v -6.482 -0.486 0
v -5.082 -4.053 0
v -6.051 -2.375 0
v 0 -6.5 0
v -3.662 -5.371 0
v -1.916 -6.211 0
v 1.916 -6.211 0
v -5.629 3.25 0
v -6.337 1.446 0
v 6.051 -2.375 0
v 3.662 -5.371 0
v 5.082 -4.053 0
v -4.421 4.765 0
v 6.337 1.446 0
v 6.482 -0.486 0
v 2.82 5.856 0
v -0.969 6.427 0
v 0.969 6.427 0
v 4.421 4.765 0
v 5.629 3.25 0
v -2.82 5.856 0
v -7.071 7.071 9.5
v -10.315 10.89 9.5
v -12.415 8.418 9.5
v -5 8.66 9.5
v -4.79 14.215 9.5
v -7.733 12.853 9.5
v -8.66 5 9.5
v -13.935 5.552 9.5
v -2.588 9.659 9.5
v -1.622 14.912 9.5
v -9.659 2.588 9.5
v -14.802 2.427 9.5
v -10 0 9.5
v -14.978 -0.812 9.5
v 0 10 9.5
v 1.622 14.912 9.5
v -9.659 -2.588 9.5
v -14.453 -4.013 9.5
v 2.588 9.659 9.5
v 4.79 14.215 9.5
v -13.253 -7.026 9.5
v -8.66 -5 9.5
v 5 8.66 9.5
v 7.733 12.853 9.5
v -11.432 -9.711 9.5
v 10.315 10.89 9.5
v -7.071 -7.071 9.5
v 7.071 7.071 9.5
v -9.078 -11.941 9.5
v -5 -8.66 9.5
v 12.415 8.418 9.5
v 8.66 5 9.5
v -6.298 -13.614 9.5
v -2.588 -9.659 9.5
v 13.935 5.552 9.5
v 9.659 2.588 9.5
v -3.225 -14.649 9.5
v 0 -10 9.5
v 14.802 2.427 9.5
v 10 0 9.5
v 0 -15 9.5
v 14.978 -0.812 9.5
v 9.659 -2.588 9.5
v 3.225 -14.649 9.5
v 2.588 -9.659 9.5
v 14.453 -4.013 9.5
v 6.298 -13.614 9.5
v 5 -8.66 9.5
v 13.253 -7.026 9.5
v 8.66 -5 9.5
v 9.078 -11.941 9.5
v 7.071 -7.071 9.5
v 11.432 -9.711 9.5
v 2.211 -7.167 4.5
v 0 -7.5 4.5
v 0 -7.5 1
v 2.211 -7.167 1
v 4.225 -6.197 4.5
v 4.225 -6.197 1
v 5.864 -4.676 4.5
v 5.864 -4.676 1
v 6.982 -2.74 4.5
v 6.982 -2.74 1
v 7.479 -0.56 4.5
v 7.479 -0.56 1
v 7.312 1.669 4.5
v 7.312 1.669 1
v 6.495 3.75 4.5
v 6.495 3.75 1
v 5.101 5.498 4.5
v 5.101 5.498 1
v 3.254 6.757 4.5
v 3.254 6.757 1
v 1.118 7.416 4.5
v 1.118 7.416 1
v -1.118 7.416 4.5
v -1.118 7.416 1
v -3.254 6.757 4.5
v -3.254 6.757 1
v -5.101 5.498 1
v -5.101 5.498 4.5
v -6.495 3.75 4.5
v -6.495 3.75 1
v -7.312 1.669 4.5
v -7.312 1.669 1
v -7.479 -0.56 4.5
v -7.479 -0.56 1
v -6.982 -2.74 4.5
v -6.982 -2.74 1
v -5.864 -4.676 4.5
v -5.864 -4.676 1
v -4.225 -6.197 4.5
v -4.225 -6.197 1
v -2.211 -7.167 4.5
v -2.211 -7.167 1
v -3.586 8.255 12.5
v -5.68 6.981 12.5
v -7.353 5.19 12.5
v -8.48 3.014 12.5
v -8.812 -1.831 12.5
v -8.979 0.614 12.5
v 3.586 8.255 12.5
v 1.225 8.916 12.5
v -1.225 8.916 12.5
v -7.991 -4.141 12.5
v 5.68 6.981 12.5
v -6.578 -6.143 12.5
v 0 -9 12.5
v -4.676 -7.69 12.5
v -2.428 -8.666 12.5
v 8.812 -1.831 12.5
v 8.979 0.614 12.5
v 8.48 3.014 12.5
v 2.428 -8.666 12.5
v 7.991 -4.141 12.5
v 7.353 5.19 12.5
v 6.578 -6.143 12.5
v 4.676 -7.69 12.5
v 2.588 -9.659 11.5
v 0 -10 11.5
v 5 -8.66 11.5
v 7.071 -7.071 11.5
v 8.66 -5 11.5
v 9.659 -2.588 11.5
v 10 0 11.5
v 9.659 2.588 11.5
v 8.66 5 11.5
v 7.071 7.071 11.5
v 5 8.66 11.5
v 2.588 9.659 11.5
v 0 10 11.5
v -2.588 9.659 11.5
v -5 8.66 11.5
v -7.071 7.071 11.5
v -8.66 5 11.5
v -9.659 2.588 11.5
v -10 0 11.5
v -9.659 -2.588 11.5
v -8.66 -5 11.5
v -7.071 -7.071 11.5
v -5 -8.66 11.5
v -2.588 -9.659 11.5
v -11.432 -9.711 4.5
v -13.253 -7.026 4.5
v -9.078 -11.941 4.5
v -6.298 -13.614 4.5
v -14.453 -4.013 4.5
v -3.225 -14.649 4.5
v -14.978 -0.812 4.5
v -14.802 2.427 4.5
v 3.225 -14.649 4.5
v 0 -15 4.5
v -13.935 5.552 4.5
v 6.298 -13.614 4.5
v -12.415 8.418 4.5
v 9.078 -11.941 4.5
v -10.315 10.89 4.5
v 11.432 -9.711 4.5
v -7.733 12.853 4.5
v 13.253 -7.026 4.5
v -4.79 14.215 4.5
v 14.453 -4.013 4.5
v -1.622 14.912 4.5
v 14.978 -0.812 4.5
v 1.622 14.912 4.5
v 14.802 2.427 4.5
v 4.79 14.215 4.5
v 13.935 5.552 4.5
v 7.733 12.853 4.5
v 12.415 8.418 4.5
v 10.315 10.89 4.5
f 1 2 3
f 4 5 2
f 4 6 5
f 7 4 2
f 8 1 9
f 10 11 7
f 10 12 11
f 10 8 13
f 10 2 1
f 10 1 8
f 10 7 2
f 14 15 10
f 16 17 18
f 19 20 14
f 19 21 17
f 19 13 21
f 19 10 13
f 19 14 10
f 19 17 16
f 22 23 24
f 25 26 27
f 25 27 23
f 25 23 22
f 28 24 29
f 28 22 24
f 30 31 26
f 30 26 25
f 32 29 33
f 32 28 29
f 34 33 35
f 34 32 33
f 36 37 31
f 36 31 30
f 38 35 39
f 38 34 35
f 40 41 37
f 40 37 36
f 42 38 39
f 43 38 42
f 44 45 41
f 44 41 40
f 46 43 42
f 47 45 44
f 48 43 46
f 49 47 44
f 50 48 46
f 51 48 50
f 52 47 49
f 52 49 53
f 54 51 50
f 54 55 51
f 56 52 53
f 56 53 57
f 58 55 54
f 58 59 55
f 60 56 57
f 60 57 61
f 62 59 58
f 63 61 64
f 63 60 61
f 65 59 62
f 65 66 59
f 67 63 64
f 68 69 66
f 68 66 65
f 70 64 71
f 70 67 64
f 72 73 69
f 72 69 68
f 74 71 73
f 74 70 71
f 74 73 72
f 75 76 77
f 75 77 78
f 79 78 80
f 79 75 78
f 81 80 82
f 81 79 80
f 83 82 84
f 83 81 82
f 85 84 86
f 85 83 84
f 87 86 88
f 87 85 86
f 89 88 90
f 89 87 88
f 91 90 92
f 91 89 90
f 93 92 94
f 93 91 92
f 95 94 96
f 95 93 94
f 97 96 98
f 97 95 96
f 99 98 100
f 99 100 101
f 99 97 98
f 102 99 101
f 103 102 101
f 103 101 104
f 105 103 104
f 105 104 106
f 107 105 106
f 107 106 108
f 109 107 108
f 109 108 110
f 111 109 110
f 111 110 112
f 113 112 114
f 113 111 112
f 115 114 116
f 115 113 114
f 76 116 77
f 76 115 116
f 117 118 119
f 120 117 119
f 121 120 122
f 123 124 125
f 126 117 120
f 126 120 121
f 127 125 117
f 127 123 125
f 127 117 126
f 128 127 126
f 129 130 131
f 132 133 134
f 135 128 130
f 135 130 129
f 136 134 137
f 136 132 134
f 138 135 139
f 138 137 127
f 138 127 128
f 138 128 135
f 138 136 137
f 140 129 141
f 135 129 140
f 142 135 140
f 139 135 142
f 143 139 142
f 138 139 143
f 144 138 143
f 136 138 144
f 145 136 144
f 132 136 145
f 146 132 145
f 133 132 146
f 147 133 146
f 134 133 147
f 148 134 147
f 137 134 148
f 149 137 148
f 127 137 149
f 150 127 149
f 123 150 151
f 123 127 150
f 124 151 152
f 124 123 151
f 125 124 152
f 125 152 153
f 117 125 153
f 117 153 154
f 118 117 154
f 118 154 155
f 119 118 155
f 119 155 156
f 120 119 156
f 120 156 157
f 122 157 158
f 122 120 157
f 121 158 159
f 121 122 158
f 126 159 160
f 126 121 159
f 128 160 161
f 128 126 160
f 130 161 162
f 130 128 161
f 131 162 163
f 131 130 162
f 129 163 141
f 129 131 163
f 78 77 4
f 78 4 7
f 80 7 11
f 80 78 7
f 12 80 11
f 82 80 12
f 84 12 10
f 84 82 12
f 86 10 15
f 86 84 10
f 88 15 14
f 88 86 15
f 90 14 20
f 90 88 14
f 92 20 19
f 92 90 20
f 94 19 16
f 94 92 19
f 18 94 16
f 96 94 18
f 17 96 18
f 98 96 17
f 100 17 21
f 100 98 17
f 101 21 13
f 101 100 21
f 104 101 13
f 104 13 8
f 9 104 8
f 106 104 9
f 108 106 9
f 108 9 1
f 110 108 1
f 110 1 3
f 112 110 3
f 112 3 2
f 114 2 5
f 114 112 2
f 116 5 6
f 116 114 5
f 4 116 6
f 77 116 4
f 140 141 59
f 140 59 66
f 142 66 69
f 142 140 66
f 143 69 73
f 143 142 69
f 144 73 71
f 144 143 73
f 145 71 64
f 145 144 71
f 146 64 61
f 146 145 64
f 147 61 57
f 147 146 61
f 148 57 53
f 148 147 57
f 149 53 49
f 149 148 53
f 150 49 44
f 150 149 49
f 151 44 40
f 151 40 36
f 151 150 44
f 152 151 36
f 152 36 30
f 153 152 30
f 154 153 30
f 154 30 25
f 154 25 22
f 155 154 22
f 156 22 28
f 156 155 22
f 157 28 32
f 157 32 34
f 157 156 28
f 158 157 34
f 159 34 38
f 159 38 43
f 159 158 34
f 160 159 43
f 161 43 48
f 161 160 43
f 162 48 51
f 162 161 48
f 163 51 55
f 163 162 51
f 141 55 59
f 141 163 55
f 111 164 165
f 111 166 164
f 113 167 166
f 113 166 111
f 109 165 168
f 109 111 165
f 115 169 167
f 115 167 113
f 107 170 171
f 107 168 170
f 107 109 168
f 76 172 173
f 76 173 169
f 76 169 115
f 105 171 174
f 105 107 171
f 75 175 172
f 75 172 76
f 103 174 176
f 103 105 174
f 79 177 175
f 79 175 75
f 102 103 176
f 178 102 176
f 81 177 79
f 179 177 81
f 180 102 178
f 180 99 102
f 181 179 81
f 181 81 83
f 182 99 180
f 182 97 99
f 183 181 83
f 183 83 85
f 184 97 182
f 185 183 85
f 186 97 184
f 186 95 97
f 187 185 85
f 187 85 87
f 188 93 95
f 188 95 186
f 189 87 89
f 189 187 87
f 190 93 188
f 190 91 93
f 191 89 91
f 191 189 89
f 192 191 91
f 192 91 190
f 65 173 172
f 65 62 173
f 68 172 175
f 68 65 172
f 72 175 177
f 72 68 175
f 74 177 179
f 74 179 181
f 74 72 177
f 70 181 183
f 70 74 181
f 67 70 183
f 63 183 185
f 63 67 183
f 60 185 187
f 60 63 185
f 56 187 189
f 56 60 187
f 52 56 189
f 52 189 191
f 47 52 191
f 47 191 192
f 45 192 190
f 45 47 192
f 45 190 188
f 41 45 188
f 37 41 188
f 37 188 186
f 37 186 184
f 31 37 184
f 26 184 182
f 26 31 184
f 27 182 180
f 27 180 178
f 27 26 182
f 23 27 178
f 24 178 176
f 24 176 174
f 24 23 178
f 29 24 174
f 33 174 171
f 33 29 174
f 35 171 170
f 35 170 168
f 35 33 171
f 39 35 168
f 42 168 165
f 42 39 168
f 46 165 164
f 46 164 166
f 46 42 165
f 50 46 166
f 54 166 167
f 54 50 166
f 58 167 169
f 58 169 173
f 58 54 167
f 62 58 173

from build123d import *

# Parameters (mm, degrees)
CHAMFER_SIZE = 1


with BuildPart() as part:
    # Sketch_1 → Revolution (revolve)
    with BuildSketch(Plane.YZ):
        Polygon((0, 0), (-7.5, 0), (-7.5, 4.5), (-15, 4.5), (-15, 9.5), (-10, 9.5), (-10, 12.5), (0, 12.5), align=None)
    revolve(axis=Axis((0, 0, 0), (0, 0, 1)))

    # Chamfer
    chamfer_edges = [part.edges().sort_by_distance(p)[0] for p in [
        (0, 7.5, 0),
        (0, 10, 12.5),
    ]]
    chamfer(chamfer_edges, length=CHAMFER_SIZE)


solid = part.part
